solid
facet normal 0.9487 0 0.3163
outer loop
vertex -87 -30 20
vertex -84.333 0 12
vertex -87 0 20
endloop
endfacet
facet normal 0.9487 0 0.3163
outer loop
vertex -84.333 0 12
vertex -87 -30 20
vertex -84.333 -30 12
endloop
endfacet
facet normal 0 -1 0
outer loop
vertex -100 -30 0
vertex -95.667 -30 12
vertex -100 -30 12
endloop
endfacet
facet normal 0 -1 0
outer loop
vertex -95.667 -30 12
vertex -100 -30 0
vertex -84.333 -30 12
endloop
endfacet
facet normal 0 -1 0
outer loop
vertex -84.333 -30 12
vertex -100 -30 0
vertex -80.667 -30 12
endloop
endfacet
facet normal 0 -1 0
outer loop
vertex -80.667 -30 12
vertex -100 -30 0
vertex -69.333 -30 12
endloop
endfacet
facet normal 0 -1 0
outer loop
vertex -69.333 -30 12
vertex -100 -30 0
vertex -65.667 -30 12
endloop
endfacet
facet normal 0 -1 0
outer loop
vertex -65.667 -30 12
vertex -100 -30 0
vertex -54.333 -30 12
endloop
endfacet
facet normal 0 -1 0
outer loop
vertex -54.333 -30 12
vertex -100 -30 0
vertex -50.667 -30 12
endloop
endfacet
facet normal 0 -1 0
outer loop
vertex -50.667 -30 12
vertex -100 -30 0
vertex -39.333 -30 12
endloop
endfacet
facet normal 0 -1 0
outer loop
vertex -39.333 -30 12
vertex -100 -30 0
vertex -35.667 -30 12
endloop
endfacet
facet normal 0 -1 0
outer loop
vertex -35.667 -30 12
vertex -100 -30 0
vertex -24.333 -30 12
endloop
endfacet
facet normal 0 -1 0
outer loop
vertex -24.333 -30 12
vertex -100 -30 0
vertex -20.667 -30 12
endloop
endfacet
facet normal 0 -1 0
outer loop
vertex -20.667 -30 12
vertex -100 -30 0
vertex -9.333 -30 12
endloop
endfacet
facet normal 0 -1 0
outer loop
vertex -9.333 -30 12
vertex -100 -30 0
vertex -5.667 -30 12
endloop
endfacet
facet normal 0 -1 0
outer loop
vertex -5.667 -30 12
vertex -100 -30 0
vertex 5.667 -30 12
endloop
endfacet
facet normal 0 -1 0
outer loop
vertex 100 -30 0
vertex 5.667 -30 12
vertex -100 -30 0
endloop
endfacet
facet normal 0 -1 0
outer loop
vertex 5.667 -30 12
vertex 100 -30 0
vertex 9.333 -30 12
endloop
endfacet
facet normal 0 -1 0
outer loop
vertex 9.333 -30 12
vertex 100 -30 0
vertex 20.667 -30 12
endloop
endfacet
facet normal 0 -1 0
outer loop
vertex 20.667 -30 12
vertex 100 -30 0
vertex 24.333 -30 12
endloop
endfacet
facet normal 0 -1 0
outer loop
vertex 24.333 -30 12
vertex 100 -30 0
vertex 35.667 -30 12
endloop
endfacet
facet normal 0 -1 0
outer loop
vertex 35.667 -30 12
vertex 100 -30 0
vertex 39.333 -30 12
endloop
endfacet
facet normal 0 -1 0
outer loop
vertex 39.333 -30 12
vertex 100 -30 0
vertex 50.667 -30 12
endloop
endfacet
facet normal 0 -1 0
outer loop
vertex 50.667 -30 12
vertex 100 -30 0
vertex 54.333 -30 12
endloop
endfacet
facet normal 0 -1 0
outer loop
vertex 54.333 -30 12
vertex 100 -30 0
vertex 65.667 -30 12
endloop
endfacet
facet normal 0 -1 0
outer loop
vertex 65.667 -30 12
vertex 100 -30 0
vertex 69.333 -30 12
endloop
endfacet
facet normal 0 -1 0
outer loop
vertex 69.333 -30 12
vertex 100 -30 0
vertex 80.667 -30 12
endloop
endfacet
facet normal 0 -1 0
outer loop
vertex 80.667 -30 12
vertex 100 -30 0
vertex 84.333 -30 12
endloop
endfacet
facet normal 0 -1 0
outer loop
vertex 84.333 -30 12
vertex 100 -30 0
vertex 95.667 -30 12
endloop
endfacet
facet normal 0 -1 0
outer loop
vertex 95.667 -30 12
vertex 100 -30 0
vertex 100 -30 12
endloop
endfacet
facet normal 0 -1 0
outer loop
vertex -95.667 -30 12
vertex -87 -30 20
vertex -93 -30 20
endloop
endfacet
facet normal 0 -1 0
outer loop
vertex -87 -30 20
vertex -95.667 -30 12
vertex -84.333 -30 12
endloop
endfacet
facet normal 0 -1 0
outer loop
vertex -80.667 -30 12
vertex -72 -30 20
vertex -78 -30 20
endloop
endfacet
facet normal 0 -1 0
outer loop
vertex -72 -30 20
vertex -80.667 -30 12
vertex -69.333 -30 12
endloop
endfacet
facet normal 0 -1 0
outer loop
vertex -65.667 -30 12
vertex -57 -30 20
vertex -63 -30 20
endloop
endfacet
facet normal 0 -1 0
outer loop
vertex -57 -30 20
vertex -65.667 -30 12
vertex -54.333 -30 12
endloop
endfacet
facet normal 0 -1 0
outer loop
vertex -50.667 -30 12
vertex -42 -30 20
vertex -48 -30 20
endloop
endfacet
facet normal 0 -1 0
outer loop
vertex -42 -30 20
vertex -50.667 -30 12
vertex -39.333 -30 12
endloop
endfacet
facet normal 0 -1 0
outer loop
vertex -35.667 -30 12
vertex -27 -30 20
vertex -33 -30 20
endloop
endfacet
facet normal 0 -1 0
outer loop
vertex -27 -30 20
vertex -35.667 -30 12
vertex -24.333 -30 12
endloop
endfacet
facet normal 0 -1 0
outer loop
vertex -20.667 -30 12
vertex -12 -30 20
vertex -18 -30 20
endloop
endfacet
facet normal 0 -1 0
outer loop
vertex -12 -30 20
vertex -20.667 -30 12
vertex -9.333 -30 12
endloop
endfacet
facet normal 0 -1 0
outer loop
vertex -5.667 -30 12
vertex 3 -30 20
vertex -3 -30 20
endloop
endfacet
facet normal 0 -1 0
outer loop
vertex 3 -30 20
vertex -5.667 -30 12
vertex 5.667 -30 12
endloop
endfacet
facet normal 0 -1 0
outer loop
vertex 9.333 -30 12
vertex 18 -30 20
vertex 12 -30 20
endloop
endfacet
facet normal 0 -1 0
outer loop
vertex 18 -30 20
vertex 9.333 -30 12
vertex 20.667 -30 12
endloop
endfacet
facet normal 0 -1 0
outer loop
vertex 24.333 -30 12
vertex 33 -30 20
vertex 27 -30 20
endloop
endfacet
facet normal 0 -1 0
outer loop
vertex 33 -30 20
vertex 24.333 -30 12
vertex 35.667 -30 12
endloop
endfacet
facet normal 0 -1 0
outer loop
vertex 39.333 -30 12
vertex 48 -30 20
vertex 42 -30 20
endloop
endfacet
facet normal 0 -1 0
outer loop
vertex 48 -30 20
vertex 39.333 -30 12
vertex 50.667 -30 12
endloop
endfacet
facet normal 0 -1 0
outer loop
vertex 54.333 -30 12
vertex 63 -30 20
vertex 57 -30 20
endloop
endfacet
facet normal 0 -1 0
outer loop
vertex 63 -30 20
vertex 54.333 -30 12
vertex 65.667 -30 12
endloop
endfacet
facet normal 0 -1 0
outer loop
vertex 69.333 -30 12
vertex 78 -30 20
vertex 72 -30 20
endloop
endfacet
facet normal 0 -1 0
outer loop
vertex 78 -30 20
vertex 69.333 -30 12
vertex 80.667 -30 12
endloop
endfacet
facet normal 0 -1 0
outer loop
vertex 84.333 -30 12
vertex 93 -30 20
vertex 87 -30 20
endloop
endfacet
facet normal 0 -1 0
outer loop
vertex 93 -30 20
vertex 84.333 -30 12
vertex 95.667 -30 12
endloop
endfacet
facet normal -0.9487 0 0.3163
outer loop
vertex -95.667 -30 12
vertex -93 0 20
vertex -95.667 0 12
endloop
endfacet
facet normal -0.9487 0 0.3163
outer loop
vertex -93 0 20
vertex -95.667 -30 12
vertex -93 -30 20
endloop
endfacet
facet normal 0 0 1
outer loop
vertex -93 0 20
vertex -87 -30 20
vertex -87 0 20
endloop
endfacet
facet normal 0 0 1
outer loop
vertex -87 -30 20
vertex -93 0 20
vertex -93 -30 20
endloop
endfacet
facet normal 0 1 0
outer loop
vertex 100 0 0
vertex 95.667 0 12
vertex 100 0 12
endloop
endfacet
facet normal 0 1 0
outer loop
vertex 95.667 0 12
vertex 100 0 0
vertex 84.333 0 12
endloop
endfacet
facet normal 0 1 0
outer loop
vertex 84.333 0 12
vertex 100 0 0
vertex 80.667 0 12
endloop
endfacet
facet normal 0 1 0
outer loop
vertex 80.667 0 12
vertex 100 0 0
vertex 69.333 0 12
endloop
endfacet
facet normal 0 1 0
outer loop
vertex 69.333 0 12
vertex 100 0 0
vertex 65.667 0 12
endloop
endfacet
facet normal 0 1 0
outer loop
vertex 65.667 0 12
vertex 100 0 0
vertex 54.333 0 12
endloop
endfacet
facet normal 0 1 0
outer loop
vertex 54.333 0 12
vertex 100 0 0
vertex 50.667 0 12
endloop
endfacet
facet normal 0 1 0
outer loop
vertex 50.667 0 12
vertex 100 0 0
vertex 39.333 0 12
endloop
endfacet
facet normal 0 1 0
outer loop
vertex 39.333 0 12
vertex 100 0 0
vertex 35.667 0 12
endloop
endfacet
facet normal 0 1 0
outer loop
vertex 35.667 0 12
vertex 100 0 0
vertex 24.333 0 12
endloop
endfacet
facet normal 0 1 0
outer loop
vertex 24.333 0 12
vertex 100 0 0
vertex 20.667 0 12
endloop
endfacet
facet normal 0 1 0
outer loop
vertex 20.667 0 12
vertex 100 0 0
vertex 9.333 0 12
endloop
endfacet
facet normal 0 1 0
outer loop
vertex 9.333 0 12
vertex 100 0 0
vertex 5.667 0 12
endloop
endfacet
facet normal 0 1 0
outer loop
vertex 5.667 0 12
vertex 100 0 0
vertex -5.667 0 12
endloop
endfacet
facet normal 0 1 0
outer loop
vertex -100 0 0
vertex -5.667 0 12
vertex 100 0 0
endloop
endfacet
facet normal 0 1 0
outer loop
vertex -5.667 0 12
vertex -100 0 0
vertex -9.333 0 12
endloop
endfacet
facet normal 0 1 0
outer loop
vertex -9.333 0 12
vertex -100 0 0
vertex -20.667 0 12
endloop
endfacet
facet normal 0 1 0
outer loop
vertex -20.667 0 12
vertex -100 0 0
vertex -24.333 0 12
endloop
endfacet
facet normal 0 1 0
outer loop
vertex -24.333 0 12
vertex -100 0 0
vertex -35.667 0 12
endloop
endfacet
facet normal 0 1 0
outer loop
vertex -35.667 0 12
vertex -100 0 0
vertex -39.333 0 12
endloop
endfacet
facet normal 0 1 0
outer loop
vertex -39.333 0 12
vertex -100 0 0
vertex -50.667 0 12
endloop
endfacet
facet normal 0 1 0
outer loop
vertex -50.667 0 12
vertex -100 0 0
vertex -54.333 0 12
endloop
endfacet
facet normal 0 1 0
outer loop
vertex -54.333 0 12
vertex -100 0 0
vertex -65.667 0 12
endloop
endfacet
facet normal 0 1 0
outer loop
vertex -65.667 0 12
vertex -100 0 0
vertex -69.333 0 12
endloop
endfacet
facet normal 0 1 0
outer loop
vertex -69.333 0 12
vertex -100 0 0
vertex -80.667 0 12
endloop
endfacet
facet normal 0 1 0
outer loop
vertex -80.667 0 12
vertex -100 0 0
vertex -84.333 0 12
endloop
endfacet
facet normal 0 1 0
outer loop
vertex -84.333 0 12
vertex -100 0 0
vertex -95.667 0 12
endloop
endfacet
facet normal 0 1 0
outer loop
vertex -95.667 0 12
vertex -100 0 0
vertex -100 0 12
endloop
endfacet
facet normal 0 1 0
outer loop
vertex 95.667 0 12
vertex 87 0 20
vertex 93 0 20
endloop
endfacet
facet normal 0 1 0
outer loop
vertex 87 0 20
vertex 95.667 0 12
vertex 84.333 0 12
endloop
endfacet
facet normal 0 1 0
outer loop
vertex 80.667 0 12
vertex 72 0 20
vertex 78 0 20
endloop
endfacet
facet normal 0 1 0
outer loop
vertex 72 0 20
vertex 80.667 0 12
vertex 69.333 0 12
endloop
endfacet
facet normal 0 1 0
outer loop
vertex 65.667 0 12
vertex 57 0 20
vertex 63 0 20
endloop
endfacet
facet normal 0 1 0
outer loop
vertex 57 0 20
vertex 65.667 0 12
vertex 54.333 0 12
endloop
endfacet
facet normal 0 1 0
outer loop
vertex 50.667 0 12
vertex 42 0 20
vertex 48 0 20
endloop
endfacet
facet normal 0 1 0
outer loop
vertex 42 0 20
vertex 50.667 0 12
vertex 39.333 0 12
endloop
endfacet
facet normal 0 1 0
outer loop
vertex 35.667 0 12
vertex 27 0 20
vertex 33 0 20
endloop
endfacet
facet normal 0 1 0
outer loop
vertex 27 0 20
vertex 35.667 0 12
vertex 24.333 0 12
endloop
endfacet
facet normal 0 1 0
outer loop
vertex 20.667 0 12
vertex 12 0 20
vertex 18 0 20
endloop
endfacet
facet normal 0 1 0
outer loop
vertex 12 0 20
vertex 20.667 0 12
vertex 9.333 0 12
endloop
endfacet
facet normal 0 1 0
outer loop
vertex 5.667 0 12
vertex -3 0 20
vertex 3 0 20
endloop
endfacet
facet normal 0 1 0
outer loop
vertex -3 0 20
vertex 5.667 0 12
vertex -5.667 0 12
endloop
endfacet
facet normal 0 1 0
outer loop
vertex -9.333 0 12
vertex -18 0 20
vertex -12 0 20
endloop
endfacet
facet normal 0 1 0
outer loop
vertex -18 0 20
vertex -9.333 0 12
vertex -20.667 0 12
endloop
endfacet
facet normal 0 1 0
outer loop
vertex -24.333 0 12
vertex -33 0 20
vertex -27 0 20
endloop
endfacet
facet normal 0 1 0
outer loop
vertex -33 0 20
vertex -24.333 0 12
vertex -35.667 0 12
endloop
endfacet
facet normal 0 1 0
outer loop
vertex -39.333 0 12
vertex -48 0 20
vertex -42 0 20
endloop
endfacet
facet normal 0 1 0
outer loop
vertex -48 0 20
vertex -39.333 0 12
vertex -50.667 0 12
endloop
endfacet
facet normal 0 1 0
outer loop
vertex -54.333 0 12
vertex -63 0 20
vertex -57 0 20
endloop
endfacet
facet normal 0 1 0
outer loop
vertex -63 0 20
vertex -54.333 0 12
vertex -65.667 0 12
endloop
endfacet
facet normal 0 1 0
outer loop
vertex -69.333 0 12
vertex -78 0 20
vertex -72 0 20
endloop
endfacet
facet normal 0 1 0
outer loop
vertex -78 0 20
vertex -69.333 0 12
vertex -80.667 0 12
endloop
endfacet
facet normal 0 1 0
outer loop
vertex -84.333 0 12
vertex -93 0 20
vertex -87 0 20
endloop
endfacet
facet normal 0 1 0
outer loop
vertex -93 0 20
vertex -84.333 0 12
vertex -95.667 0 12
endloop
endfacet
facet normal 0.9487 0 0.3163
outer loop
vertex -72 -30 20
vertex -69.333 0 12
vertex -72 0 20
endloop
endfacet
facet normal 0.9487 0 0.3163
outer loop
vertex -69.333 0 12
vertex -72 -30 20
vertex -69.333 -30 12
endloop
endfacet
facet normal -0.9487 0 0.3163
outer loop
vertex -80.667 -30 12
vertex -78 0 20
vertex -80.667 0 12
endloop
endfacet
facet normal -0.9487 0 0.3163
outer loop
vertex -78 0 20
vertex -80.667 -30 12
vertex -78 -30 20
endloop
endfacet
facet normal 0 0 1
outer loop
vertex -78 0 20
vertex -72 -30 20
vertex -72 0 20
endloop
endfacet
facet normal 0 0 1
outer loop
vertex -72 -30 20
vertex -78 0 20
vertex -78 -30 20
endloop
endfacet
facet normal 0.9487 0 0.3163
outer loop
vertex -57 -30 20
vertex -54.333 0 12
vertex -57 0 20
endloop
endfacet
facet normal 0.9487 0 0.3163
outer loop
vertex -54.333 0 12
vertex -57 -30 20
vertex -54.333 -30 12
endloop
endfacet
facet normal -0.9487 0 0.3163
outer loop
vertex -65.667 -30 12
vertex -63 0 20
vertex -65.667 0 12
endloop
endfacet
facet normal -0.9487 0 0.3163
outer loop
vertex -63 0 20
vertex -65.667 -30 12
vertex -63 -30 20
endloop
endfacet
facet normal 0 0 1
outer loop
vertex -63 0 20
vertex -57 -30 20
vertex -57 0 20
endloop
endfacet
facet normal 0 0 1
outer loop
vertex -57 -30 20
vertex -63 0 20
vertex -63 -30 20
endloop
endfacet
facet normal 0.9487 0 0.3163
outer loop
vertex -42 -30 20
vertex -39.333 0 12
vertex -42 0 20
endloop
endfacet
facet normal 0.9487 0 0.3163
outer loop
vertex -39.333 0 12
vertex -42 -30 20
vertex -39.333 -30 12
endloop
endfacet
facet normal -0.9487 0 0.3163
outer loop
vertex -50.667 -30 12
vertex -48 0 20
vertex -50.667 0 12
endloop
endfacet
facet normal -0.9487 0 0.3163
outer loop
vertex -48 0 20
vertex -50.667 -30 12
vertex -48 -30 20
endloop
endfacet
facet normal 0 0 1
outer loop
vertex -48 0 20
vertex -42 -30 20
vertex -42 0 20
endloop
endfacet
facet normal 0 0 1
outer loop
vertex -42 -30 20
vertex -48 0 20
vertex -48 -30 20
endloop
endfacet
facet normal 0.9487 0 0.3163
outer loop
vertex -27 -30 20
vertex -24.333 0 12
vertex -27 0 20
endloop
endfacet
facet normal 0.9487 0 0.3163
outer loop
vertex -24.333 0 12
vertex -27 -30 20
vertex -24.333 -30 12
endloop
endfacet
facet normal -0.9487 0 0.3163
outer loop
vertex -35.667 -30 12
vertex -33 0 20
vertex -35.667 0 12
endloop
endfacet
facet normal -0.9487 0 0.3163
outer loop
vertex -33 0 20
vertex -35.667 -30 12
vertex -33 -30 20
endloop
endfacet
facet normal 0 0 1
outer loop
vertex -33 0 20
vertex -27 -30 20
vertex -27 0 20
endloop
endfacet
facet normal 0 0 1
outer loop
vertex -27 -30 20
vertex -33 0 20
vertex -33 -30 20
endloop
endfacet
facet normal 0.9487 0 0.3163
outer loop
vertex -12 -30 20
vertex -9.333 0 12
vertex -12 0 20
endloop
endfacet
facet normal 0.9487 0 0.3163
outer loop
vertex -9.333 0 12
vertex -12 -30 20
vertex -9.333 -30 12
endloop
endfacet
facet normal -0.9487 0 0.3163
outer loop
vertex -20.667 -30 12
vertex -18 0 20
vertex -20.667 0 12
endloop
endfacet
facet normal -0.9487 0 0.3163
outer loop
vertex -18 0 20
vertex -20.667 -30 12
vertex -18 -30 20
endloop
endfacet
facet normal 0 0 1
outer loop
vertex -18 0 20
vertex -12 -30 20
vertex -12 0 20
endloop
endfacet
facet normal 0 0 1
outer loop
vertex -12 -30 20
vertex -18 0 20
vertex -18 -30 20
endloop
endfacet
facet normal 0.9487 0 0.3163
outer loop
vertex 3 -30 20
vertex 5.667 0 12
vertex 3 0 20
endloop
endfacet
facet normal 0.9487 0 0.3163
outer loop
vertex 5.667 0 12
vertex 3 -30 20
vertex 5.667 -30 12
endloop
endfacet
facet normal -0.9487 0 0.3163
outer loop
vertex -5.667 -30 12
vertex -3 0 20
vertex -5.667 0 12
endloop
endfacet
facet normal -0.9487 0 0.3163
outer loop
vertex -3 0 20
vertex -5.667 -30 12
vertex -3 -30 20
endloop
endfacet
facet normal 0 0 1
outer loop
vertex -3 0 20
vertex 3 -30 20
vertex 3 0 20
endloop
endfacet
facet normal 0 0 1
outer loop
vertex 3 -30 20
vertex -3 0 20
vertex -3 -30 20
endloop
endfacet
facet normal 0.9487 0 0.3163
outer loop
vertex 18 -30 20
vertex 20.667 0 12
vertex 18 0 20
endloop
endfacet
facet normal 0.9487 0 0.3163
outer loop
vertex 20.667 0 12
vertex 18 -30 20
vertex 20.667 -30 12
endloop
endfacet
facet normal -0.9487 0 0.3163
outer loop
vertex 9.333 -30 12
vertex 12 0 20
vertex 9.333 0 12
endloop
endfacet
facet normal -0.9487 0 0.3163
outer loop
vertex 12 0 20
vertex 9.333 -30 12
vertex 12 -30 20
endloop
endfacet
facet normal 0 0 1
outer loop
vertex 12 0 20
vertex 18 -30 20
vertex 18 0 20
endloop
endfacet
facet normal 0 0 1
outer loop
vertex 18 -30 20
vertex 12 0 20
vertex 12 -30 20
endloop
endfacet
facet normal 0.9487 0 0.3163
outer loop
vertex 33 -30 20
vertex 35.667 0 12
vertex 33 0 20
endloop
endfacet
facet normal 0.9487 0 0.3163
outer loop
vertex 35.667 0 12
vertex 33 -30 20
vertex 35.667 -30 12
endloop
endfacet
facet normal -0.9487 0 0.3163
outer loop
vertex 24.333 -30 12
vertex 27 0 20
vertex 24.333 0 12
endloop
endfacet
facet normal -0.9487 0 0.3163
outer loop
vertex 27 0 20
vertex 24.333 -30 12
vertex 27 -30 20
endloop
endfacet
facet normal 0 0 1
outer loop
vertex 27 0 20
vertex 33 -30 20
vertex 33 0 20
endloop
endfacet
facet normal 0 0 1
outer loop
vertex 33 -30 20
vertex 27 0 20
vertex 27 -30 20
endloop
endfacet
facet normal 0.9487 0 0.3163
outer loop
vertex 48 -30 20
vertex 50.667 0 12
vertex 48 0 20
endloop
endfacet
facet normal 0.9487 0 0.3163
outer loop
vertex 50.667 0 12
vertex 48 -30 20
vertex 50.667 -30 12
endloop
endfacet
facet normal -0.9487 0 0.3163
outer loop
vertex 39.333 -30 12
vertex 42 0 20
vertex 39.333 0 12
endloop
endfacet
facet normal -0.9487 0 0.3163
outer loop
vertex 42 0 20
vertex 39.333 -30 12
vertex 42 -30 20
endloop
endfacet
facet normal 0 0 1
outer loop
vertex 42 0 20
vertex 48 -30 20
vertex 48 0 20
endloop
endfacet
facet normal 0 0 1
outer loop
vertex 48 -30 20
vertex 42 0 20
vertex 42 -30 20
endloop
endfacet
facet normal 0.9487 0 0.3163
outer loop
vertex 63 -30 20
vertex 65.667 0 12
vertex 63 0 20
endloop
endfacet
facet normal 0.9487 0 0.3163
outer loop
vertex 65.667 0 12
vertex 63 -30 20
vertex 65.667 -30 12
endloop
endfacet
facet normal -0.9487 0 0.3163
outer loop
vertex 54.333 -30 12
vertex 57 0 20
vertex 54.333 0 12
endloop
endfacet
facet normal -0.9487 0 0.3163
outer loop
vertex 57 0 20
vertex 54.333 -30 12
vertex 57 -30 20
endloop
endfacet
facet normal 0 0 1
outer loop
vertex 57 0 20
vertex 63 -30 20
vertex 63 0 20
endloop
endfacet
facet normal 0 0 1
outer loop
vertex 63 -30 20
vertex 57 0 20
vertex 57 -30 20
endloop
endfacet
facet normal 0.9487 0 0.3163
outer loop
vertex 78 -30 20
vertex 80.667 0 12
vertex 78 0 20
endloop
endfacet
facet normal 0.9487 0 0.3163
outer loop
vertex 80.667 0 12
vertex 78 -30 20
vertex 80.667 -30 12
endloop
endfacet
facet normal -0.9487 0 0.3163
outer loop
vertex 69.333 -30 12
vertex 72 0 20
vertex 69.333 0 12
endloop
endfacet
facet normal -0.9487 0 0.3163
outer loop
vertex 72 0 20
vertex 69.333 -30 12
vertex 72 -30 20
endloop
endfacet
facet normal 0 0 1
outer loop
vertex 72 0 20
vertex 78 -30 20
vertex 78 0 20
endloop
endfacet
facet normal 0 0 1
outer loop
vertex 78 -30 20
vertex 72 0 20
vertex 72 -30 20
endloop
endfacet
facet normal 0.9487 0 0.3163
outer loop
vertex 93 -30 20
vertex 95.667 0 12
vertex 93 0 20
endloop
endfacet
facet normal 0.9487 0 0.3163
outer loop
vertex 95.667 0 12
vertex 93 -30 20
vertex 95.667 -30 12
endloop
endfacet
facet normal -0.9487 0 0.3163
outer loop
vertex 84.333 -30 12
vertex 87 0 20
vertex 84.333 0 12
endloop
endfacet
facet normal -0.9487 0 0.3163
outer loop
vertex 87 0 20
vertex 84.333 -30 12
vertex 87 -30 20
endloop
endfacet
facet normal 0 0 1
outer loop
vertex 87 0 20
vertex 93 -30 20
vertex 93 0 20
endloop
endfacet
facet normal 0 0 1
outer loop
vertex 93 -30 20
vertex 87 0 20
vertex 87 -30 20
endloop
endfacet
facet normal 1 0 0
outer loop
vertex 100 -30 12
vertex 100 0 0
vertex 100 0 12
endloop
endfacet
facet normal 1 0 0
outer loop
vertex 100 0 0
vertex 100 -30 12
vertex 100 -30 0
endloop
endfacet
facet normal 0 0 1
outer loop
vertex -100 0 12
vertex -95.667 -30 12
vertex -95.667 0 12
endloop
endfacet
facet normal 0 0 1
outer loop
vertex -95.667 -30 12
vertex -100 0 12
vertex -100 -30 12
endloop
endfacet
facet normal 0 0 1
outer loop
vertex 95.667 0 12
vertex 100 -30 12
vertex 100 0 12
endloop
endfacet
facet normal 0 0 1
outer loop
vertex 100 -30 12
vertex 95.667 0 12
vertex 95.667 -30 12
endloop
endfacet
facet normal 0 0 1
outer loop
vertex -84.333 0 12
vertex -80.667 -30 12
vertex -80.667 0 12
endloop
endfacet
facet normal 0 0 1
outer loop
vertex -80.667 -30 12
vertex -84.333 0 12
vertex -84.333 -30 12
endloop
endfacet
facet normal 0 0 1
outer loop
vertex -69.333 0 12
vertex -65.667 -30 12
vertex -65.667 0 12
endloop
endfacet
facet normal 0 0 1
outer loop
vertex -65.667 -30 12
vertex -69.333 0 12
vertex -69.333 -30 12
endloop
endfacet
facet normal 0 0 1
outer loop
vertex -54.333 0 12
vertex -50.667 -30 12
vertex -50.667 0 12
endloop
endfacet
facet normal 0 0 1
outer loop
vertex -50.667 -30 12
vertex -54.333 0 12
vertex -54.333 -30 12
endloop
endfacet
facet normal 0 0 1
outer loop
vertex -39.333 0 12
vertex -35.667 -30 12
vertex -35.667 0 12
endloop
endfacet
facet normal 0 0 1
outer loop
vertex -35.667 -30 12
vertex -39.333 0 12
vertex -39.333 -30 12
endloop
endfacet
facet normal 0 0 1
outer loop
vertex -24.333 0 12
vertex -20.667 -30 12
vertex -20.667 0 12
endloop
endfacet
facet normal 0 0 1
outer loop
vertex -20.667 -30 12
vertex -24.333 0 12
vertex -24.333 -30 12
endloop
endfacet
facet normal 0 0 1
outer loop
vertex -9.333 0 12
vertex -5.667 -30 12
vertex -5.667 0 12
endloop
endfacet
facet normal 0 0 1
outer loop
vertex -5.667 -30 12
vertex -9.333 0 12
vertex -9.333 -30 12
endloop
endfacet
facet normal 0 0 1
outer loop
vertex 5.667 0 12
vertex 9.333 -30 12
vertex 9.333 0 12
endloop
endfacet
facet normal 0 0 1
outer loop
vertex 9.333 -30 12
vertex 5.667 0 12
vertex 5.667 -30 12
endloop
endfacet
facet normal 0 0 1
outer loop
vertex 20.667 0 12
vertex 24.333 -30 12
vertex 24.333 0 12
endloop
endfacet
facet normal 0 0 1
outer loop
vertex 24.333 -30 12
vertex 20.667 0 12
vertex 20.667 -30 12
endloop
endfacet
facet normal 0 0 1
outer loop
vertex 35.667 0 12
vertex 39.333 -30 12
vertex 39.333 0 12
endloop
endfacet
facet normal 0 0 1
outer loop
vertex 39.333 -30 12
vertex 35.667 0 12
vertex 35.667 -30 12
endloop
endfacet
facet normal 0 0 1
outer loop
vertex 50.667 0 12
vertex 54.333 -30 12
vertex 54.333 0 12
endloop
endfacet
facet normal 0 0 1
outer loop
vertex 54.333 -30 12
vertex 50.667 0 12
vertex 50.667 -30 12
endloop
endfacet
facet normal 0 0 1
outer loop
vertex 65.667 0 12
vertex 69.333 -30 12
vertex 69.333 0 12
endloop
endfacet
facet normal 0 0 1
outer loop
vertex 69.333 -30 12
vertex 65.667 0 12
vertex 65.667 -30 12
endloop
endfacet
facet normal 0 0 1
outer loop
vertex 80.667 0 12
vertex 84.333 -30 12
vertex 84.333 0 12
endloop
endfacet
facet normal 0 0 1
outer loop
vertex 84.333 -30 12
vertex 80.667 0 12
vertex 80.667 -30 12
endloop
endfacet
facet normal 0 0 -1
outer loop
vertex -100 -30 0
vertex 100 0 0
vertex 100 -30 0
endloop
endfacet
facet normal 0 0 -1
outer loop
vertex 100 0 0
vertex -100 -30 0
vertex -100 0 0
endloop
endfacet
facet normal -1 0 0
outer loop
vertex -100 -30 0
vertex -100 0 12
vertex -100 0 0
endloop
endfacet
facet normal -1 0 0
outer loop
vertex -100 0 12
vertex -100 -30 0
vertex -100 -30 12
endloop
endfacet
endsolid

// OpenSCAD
$fn = 32;

// ----------------------------------------------------------------------
// Toothed rack, 13 teeth
// 15 mm pitch, 8 mm teeth
// ----------------------------------------------------------------------

// --- parameters (mm) ---
bar_w = 30;   // bar width (Y)
bar_h = 12;   // bar height (Z)
teeth = 13;   // number of teeth
pitch = 15;   // tooth pitch
tooth_h = 8;  // tooth height above the bar
root_w = 12;  // tooth width at the root
crest_w = 6;  // tooth width at the crest

// --- derived feature positions (mm) ---
span = (teeth - 1) * pitch;  // = 180   distance between the outer teeth
bar_l = span + root_w + 8;   // = 200   bar length: teeth plus 4 mm at each end
tooth_x = -span / 2;         // = -90   X of the first tooth
height = bar_h + tooth_h;    // = 20   overall height
feature_centers = [
  [tooth_x + 0 * pitch, -bar_w / 2],
  [tooth_x + 1 * pitch, -bar_w / 2],
  [tooth_x + 2 * pitch, -bar_w / 2],
  [tooth_x + 3 * pitch, -bar_w / 2],
  [tooth_x + 4 * pitch, -bar_w / 2],
  [tooth_x + 5 * pitch, -bar_w / 2],
  [tooth_x + 6 * pitch, -bar_w / 2],
  [tooth_x + 7 * pitch, -bar_w / 2],
  [tooth_x + 8 * pitch, -bar_w / 2],
  [tooth_x + 9 * pitch, -bar_w / 2],
  [tooth_x + 10 * pitch, -bar_w / 2],
  [tooth_x + 11 * pitch, -bar_w / 2],
  [tooth_x + 12 * pitch, -bar_w / 2]
];   // tooth centre line, drives the tooth loop

// bar with a rack of teeth, one extruded trapezoium per centre
module rack_tooth() {
  linear_extrude(height = bar_w)
    polygon(points = [
      [0, 0],
      [root_w, 0],
      [root_w / 2 + crest_w / 2, tooth_h + 1],
      [root_w / 2 - crest_w / 2, tooth_h + 1]
    ]);
}

union() {
  translate([-bar_l / 2, -bar_w, 0]) cube([bar_l, bar_w, bar_h]);
  for (centre = feature_centers)
    translate([centre[0] - root_w / 2, 0, bar_h - 1]) rotate([90, 0, 0]) rack_tooth();
}
